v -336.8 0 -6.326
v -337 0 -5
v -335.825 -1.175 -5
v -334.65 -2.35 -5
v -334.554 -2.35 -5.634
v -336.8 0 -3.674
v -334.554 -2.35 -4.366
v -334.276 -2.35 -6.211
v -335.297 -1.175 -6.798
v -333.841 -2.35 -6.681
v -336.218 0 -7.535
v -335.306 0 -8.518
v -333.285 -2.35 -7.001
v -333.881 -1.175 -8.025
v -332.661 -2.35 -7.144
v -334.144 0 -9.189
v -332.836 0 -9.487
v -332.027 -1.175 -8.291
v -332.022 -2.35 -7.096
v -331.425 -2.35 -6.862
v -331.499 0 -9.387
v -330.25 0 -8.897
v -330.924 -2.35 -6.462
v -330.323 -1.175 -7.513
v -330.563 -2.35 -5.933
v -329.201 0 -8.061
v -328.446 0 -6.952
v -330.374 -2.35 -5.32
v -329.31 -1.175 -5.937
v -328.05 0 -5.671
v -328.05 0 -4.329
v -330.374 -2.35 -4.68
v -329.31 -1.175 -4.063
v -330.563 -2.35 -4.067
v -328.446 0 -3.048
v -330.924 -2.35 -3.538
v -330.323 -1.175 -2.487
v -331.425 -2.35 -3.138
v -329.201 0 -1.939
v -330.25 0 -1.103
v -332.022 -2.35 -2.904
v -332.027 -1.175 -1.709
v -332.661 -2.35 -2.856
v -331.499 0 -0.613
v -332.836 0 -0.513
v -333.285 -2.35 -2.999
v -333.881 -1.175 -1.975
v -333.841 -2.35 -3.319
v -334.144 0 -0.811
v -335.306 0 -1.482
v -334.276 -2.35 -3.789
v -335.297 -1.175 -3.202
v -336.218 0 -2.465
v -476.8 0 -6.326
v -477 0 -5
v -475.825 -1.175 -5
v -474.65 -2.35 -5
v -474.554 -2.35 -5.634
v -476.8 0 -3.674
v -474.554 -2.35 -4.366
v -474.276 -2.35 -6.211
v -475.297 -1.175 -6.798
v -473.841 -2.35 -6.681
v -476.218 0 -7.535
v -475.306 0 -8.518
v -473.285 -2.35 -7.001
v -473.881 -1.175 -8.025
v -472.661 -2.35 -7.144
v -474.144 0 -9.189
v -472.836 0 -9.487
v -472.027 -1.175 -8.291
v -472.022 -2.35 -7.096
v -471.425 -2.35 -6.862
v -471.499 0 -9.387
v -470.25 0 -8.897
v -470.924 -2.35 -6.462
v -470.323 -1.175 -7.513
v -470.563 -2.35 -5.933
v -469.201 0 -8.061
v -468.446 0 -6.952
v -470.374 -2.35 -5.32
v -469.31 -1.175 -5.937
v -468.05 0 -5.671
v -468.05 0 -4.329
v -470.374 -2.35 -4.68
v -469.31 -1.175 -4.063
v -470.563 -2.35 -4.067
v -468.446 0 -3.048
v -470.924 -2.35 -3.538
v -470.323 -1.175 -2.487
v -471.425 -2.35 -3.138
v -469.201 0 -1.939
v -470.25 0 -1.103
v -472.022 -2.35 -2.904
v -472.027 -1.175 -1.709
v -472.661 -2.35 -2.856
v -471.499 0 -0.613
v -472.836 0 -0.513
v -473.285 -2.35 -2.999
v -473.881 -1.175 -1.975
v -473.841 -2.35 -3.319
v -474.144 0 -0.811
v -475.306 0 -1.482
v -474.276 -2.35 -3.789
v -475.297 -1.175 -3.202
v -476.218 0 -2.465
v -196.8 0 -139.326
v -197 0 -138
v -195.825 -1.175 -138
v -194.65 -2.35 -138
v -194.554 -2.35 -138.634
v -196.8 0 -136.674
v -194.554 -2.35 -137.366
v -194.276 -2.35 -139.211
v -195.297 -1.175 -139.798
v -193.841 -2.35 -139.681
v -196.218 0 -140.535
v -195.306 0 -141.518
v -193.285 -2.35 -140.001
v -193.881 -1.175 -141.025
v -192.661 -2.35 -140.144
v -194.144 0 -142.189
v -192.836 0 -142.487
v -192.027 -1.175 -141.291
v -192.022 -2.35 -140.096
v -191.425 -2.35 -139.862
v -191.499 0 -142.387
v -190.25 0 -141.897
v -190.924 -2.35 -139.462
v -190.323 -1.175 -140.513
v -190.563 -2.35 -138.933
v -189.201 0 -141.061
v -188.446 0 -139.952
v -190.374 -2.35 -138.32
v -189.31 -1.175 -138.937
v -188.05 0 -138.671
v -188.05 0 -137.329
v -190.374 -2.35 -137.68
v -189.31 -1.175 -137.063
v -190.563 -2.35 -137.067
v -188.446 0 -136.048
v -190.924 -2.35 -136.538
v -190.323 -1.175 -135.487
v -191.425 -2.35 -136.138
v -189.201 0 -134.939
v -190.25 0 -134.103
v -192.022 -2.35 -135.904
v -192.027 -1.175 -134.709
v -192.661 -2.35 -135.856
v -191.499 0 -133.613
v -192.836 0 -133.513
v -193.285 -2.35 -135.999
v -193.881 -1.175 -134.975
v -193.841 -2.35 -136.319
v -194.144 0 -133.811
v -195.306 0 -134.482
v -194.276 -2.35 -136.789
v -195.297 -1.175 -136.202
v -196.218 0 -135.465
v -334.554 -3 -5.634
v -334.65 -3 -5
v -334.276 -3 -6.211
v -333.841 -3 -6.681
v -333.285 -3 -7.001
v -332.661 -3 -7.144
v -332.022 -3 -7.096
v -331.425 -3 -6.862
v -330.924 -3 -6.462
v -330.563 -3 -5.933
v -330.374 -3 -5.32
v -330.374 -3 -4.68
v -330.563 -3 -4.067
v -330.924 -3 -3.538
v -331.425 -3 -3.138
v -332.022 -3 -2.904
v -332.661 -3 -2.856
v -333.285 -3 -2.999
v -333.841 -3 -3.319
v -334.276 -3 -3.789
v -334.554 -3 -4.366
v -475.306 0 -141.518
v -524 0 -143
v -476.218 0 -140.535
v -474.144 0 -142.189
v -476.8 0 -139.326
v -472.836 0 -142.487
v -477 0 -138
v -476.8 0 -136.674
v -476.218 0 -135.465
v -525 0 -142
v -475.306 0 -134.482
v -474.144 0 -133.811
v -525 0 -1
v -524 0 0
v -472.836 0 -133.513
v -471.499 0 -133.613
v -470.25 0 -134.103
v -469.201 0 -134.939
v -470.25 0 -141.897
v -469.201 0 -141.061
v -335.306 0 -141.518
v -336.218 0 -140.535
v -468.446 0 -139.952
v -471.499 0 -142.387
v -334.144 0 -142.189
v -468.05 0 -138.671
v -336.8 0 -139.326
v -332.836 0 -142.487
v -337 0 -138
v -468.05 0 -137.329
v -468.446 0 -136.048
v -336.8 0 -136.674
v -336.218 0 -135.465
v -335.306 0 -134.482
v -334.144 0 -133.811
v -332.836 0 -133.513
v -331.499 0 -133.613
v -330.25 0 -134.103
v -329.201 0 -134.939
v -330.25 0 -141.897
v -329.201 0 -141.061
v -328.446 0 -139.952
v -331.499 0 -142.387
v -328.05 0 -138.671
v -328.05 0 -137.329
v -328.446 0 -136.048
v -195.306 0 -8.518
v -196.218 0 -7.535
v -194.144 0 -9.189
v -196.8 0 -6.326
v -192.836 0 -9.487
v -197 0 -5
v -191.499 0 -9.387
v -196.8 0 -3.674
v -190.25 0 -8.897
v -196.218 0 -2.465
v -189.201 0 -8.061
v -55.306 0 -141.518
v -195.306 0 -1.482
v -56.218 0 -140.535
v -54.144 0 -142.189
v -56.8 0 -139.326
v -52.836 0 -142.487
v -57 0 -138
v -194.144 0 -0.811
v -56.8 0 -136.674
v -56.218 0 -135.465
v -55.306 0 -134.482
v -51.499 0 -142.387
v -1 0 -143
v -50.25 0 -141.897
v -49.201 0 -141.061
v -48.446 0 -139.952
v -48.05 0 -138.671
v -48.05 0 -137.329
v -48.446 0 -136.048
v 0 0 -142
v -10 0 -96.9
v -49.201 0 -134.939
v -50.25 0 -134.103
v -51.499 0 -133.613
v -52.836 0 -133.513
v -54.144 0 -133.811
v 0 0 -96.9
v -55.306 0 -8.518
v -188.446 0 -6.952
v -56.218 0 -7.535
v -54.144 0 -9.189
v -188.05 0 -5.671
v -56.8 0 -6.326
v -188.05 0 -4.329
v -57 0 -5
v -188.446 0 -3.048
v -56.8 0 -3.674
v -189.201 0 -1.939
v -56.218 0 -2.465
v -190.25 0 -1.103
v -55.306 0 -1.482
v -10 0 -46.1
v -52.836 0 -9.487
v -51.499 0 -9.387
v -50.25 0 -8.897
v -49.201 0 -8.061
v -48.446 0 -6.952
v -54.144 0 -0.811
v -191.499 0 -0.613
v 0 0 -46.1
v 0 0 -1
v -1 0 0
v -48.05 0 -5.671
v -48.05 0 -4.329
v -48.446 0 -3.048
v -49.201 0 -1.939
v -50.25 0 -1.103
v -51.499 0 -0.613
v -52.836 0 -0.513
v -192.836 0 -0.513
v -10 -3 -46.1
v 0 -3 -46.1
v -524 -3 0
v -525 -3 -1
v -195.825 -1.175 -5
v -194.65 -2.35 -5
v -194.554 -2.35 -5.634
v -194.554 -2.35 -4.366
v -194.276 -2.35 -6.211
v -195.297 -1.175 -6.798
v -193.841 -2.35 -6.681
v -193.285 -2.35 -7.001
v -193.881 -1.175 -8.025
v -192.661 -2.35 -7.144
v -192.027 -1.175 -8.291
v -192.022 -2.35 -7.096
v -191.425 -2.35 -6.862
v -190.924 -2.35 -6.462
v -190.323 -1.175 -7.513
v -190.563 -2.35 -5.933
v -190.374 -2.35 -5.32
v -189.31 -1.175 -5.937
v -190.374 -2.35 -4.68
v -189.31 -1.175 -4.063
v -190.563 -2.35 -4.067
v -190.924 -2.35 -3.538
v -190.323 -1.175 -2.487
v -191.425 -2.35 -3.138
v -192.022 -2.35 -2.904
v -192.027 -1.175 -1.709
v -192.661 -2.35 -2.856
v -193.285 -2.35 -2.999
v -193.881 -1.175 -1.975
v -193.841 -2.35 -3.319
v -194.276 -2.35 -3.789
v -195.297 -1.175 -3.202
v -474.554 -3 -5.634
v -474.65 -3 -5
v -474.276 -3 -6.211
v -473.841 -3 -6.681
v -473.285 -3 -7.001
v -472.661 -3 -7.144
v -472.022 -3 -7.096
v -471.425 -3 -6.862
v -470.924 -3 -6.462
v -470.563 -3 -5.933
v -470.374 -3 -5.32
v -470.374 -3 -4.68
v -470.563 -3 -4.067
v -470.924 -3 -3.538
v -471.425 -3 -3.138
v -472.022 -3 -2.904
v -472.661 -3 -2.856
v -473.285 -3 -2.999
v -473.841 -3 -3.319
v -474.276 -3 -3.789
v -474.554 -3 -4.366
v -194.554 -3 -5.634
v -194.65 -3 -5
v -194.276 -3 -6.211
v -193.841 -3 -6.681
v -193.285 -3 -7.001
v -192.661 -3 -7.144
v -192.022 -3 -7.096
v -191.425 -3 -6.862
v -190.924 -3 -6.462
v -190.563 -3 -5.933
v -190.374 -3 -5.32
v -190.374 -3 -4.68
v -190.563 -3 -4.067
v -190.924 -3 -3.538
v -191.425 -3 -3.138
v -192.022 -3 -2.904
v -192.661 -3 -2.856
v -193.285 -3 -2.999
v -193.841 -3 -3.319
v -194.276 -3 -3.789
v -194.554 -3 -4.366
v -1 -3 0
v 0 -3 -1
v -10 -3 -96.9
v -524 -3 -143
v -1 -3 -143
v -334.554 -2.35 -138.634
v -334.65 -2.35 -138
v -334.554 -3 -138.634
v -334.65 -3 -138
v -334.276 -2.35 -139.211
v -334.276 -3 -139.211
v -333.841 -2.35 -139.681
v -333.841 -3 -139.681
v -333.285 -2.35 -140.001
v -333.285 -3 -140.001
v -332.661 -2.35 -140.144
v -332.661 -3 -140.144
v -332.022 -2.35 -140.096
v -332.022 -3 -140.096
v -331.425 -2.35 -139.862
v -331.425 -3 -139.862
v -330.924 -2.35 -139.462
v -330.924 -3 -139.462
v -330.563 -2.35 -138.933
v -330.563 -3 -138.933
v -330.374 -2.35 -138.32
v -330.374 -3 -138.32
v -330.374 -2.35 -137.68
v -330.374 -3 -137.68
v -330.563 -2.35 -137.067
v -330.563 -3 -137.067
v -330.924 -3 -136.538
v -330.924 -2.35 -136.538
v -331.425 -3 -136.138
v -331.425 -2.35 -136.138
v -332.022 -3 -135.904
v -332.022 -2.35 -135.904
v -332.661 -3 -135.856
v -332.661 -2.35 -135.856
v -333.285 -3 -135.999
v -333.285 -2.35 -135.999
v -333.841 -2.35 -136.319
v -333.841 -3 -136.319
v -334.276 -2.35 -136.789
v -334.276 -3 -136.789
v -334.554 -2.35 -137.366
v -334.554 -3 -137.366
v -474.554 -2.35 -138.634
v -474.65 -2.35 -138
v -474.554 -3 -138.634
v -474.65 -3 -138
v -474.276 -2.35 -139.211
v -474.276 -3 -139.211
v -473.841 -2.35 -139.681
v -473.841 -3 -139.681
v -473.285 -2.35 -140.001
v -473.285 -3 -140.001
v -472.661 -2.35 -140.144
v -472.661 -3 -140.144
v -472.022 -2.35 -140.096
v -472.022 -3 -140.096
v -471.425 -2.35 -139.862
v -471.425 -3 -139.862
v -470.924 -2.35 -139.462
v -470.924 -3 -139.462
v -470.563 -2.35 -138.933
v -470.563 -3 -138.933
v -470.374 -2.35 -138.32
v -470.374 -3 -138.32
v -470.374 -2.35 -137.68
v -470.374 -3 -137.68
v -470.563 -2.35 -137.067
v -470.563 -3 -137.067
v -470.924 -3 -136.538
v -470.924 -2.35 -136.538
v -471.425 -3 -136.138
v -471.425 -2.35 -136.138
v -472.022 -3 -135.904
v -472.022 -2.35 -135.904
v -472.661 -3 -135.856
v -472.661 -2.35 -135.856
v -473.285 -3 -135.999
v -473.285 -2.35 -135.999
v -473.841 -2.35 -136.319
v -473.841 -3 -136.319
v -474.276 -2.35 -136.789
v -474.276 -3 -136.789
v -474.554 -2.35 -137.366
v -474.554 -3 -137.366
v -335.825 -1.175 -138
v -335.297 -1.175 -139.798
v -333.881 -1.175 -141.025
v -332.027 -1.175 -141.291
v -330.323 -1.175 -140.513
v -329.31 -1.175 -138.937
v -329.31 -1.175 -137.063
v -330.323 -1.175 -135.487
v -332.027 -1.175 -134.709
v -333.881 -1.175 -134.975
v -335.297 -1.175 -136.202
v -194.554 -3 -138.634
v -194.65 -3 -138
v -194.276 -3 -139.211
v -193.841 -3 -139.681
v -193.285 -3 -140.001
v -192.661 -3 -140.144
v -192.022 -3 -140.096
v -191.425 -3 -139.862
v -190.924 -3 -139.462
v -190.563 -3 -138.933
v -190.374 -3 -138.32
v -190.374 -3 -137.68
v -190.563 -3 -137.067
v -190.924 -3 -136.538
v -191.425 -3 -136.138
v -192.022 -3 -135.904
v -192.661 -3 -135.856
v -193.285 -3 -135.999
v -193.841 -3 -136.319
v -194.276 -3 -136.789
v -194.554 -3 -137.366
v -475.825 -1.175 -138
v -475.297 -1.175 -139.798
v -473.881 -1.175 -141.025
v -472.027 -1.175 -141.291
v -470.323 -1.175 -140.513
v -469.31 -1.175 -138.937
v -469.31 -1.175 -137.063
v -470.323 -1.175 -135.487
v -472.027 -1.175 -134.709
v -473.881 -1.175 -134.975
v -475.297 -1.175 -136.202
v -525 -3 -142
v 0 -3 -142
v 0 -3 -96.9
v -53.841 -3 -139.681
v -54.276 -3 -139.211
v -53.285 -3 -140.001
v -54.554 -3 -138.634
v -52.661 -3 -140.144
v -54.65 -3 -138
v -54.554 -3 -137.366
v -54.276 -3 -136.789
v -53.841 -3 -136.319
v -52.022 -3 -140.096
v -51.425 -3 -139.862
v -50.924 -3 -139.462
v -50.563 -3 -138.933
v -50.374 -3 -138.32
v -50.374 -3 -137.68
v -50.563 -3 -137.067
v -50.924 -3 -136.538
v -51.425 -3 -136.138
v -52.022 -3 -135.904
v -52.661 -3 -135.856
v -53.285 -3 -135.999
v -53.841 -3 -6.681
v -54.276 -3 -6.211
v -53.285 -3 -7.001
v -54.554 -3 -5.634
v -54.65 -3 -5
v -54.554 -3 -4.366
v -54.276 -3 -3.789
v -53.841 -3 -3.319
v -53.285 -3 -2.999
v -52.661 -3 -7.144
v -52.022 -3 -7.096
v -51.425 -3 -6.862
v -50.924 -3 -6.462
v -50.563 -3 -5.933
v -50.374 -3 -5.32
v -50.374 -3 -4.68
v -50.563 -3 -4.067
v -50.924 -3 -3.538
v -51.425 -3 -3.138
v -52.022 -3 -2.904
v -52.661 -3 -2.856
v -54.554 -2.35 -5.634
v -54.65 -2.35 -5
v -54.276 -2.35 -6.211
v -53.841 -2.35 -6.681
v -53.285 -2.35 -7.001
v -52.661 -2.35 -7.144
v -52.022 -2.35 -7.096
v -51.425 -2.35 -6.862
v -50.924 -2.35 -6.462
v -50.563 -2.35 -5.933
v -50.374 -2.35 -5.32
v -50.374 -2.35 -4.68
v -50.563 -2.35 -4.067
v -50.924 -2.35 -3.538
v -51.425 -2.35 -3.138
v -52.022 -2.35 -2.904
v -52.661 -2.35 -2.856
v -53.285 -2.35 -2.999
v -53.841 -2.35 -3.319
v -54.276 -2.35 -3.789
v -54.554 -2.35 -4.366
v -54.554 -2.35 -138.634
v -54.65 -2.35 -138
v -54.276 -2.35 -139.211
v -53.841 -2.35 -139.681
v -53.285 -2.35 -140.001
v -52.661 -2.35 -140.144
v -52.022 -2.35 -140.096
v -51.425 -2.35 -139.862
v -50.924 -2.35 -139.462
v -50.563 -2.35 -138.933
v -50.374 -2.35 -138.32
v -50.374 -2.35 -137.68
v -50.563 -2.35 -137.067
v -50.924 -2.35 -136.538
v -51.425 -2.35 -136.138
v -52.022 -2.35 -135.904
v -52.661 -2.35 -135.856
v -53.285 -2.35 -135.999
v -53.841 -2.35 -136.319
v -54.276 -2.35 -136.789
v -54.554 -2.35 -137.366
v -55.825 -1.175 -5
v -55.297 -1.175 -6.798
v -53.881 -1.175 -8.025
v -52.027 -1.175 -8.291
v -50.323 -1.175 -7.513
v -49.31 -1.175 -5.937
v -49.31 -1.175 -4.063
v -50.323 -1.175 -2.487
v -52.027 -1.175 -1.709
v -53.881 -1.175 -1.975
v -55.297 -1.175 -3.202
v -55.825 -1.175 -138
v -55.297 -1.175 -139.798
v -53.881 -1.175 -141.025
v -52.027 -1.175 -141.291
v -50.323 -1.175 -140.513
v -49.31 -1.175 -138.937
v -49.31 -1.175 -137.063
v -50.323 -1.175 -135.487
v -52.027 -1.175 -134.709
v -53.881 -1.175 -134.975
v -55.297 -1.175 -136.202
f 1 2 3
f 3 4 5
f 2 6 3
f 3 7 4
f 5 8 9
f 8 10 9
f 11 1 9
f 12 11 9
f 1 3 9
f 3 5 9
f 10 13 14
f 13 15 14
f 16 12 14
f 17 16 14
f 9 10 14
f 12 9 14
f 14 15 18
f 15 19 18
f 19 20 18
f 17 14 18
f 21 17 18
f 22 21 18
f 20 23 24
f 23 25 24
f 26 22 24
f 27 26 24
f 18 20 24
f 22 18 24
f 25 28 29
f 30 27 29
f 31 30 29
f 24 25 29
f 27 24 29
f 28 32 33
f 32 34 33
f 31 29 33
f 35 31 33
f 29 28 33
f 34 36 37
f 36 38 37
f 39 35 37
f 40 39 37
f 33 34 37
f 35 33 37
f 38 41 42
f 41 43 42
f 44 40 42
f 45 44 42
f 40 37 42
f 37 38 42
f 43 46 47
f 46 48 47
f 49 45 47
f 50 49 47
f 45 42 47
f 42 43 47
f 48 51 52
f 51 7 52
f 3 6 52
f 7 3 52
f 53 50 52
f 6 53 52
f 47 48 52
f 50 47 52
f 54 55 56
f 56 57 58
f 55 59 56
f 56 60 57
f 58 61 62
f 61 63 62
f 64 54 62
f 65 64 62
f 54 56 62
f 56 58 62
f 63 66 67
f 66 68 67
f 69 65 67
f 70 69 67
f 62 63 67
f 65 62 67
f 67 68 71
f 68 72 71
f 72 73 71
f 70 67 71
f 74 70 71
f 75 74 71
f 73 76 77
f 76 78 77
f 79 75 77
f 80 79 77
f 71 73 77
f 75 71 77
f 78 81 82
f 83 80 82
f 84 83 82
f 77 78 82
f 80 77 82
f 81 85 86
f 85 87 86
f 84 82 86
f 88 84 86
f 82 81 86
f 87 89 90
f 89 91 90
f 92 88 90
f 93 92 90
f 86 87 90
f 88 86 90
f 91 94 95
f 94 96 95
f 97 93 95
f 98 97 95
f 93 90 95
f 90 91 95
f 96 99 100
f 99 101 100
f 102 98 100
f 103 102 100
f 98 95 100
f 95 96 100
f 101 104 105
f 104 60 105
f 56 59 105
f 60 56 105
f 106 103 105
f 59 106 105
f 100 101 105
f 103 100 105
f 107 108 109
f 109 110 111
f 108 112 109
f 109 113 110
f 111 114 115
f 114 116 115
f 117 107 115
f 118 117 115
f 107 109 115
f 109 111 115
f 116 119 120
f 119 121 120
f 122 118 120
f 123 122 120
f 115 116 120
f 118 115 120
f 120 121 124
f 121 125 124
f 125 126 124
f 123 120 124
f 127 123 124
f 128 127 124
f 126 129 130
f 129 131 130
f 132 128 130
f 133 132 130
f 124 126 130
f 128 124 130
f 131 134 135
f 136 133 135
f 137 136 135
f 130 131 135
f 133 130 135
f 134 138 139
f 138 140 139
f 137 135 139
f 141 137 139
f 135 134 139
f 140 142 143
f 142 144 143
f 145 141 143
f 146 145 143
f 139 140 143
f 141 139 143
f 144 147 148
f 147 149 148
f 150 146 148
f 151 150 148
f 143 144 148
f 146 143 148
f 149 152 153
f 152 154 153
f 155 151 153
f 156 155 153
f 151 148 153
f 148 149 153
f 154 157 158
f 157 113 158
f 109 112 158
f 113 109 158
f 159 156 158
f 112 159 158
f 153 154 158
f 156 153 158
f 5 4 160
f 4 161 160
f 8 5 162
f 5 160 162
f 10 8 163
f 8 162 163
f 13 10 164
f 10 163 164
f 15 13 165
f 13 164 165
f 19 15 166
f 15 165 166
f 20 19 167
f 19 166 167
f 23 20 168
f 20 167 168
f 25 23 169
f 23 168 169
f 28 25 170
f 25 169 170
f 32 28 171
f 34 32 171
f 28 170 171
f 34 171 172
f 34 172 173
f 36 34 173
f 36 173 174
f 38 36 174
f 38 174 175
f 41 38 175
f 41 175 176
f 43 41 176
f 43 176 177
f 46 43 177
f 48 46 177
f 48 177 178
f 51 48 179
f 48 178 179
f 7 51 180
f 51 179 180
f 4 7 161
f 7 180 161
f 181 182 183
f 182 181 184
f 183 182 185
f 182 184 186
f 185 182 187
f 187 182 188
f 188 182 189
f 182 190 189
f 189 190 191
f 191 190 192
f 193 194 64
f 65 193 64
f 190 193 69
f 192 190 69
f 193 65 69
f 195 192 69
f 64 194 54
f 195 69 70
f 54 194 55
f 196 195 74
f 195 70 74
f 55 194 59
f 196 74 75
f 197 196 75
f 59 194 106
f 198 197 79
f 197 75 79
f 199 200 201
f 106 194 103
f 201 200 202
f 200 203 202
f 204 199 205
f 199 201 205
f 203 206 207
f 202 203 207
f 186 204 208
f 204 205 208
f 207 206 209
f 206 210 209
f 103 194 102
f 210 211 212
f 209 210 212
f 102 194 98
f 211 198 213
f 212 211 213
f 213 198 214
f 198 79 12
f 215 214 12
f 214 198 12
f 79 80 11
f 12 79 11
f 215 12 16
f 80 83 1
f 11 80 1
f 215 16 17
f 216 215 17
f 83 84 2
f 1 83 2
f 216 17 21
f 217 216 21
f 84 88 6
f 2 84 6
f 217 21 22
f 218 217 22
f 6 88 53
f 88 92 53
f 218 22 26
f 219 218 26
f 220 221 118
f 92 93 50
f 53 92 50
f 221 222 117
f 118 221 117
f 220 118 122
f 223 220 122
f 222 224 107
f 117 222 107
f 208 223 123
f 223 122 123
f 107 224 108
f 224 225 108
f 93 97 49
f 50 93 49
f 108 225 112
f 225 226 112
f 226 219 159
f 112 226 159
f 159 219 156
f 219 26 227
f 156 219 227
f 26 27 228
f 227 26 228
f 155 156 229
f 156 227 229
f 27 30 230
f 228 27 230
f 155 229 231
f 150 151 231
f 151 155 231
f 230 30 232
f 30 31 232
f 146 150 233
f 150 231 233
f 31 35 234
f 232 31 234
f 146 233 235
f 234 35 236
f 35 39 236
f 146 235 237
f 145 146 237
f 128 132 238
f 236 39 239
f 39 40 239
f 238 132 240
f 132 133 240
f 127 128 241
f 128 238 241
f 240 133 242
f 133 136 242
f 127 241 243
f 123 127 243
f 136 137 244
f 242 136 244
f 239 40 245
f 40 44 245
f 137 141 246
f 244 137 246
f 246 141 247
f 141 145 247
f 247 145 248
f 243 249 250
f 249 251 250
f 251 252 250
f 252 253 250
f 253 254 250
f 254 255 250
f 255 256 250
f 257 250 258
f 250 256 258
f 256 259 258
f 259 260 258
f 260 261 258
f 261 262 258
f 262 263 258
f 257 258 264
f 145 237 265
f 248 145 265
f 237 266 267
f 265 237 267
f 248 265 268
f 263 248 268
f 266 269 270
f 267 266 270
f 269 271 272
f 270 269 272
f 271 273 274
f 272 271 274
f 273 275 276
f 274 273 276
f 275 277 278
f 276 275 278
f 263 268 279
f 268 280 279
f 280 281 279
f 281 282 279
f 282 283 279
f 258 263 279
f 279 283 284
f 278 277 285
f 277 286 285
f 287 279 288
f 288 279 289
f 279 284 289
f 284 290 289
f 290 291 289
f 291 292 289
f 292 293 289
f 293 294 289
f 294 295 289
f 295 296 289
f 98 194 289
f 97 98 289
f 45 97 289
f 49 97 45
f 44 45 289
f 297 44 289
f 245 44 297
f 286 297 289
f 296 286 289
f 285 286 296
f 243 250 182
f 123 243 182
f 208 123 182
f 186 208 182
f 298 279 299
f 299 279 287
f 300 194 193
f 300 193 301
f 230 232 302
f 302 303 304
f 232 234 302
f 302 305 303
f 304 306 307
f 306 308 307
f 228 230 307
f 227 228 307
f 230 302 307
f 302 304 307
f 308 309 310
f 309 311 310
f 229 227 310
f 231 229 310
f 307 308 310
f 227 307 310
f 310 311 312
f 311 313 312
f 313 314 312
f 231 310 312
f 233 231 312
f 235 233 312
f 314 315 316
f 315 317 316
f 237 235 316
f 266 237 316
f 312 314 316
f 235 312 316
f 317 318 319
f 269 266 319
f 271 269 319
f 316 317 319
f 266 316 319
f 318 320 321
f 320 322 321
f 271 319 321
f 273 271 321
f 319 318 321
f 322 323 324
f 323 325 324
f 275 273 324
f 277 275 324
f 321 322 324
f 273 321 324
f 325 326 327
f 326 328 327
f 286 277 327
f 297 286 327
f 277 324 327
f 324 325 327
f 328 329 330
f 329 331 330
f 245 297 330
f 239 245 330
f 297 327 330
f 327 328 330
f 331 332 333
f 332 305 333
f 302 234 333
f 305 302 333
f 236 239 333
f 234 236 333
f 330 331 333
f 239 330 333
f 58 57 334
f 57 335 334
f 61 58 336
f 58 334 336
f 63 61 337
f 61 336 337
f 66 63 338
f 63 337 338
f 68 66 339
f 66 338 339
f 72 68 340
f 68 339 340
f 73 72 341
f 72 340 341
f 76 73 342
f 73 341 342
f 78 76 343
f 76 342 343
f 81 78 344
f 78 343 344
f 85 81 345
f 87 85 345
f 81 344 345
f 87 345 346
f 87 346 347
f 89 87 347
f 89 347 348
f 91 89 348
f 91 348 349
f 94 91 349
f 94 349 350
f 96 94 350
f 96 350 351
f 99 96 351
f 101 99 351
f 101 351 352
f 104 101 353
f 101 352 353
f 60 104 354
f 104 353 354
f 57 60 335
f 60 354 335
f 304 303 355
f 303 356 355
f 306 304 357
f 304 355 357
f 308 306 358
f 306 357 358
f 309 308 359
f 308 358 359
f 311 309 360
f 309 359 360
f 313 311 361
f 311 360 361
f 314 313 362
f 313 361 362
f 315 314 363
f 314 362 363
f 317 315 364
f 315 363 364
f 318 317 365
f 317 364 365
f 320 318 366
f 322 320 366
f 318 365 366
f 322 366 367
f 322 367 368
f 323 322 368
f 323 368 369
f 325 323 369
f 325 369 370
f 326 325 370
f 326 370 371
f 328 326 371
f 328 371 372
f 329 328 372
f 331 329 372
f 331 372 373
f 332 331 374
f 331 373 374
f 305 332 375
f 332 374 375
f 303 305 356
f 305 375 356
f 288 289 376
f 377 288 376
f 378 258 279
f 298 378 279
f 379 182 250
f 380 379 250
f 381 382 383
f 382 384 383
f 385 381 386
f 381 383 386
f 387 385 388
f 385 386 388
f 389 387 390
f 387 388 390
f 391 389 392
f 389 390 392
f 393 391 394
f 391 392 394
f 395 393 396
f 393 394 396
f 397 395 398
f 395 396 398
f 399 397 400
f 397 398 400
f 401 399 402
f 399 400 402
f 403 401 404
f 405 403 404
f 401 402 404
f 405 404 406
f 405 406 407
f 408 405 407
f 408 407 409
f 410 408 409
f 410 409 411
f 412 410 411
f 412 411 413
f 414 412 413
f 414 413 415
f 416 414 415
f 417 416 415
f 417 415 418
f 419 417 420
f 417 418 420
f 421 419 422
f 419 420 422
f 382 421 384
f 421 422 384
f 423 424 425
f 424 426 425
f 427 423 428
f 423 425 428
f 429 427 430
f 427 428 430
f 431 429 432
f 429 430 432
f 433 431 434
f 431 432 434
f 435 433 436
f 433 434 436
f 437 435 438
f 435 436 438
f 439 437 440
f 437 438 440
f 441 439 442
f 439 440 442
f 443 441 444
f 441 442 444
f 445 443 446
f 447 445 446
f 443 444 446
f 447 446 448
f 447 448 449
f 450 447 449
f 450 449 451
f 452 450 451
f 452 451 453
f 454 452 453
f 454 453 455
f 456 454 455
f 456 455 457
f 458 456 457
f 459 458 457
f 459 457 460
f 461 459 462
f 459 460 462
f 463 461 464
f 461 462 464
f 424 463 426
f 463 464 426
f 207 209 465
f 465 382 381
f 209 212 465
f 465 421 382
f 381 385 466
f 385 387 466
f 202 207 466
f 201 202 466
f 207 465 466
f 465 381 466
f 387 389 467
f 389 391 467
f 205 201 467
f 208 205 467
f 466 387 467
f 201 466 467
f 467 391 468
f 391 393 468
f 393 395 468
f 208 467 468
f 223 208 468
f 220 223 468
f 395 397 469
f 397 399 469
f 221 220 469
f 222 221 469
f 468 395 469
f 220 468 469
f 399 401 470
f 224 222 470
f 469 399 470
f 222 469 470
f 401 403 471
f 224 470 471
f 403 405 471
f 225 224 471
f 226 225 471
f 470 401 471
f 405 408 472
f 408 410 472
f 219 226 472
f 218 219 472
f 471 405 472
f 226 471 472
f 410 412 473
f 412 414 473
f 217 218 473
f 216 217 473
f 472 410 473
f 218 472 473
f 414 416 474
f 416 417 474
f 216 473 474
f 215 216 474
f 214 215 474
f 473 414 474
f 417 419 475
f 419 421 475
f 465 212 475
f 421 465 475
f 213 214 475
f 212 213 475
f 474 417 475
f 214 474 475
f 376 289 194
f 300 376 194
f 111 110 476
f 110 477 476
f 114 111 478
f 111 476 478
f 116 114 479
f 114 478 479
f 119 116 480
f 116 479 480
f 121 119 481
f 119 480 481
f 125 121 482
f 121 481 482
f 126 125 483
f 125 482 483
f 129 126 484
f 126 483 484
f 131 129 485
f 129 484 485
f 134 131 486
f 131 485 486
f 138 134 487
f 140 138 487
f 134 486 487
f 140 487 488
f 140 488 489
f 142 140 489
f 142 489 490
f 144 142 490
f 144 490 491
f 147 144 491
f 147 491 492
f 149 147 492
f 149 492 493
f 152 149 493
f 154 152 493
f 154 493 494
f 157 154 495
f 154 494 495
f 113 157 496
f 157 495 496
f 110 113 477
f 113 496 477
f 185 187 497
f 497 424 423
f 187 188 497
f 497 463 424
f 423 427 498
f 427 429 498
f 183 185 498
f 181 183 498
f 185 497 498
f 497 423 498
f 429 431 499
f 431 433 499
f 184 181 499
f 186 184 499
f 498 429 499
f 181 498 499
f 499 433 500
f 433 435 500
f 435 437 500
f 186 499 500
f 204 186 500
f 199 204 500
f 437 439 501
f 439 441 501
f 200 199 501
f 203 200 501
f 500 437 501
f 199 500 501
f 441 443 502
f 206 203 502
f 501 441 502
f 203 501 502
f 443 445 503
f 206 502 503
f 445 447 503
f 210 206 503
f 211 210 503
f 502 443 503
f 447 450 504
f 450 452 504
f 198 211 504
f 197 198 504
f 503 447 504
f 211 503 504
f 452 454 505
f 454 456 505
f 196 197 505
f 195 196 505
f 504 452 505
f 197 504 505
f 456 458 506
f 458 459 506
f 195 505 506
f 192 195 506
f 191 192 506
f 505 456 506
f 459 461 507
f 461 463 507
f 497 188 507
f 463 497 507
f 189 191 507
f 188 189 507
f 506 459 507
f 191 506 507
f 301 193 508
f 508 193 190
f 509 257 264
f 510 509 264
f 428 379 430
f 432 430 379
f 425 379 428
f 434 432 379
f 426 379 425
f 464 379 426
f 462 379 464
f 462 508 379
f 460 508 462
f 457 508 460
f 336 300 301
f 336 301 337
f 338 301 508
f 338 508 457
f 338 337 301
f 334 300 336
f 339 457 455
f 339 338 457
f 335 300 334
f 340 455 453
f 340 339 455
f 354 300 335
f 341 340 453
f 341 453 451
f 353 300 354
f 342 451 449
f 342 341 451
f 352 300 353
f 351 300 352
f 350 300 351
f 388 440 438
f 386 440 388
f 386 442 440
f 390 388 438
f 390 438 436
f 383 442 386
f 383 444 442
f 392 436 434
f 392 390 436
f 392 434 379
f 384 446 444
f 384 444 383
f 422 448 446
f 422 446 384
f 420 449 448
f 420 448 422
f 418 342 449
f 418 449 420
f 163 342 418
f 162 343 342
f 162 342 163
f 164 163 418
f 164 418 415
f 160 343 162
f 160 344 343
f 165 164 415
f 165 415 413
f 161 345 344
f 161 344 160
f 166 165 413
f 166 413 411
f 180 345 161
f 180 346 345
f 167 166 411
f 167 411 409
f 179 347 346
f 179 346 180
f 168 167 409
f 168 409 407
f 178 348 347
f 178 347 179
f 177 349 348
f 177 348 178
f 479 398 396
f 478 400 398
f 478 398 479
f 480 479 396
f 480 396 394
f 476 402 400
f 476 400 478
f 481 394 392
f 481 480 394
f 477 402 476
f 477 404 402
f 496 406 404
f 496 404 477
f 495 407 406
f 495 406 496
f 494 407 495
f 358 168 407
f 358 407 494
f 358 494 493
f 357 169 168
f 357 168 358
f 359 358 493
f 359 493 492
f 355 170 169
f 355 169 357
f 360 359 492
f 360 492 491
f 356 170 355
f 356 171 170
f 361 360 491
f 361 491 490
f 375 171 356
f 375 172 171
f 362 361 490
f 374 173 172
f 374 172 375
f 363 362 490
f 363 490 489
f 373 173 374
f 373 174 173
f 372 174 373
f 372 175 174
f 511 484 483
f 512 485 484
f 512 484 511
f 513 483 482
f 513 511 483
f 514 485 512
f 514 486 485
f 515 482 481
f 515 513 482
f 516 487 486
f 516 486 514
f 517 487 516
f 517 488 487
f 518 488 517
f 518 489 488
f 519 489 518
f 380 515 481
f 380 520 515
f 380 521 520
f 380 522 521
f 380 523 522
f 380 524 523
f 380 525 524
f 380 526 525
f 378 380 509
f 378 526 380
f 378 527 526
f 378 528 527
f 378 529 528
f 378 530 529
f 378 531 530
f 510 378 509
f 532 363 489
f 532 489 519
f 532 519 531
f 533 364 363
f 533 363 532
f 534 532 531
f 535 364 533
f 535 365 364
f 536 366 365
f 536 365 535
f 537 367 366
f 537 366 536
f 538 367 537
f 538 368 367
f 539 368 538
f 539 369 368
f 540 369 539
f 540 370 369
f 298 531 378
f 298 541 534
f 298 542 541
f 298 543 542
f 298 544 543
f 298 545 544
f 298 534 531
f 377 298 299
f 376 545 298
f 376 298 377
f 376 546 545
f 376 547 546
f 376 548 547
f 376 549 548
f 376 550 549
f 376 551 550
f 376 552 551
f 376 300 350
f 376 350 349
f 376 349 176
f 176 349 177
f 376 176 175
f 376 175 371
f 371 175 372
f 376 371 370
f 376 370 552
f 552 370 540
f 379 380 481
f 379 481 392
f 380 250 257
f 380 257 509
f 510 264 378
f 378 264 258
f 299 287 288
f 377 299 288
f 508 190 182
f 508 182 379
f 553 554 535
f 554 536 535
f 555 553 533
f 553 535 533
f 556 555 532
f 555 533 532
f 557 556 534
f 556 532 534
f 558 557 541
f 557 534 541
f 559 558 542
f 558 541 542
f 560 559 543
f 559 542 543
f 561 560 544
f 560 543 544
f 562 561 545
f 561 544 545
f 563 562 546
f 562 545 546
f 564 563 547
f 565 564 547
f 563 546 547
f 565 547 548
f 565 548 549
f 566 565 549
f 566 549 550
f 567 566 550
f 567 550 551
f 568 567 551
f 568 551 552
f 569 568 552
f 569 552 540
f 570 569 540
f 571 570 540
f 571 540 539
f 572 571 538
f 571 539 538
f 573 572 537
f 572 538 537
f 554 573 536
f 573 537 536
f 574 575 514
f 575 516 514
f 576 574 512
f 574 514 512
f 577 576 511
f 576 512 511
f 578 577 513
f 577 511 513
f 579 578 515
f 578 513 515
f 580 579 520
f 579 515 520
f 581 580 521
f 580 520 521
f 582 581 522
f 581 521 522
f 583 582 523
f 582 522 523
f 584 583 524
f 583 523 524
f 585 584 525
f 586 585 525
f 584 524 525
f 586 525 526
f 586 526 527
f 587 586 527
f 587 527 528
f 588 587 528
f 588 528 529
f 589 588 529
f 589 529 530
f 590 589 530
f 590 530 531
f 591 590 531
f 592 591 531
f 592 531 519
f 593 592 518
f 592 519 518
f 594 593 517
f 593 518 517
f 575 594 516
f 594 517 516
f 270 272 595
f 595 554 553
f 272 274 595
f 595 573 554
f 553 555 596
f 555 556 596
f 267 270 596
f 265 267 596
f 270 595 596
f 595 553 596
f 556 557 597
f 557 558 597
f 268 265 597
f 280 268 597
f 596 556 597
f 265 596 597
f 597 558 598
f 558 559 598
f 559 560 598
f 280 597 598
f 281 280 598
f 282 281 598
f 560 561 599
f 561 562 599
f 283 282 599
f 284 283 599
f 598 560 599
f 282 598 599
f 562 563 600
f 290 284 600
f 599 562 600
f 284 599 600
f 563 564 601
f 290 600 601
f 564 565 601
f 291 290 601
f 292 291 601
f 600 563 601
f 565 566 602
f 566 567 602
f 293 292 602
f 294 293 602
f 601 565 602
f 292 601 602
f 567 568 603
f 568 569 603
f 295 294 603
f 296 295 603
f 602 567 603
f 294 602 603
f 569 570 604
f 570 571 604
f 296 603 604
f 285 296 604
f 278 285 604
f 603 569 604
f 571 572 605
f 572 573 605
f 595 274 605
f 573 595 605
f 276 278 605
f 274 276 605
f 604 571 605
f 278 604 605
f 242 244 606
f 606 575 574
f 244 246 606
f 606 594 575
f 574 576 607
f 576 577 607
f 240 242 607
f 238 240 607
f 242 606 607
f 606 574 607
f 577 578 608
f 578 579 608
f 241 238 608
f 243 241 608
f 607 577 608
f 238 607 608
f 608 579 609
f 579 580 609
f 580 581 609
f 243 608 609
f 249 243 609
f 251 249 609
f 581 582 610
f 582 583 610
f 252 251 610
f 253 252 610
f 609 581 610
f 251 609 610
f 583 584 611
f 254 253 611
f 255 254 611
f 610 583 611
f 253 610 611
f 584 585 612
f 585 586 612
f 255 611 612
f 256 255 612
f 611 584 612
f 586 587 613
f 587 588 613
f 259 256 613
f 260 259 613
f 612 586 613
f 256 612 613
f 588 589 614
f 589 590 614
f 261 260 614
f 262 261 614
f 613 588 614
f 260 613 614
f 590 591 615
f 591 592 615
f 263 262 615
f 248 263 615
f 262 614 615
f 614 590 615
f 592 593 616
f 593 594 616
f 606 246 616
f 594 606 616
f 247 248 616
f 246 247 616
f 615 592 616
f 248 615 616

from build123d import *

# Parameters (mm, degrees)
F1_DEPTH       = 3
F3_D           = 4.3
F3_CSINK_D     = 9
F3_CSINK_ANGLE = 90
F4_SIZE        = 1


# Not quite as in the source:
# - a feature names something its author has since deleted; it is built from what else it names


with BuildPart() as f1:
    # F0 (on Front) → F1 (new body)
    with BuildSketch(Plane.XZ):
        Polygon((0, -46.1), (0, 0), (-525, 0), (-525, -143), (0, -143), (0, -96.9), (-10, -96.9), (-10, -46.1), align=None)
    extrude(amount=F1_DEPTH)

    # F3 (through all)
    with Locations(Plane(origin=(0, 0, 0), x_dir=(1, 0, 0), z_dir=(0, 1, 0))):
        with Locations((-472.5, 5), (-332.5, 5), (-192.5, 5), (-52.5, 5), (-52.5, 138), (-192.5, 138), (-332.5, 138), (-472.5, 138)):
            CounterSinkHole(F3_D / 2, F3_CSINK_D / 2, counter_sink_angle=F3_CSINK_ANGLE)

    # F4
    f4_edges = [f1.edges().sort_by_distance(p)[0] for p in [
        (-525, -1.5, 0),
        (-525, -1.5, -143),
        (0, -1.5, -143),
        (0, -1.5, 0),
    ]]
    chamfer(f4_edges, length=F4_SIZE)


solid = f1.part
